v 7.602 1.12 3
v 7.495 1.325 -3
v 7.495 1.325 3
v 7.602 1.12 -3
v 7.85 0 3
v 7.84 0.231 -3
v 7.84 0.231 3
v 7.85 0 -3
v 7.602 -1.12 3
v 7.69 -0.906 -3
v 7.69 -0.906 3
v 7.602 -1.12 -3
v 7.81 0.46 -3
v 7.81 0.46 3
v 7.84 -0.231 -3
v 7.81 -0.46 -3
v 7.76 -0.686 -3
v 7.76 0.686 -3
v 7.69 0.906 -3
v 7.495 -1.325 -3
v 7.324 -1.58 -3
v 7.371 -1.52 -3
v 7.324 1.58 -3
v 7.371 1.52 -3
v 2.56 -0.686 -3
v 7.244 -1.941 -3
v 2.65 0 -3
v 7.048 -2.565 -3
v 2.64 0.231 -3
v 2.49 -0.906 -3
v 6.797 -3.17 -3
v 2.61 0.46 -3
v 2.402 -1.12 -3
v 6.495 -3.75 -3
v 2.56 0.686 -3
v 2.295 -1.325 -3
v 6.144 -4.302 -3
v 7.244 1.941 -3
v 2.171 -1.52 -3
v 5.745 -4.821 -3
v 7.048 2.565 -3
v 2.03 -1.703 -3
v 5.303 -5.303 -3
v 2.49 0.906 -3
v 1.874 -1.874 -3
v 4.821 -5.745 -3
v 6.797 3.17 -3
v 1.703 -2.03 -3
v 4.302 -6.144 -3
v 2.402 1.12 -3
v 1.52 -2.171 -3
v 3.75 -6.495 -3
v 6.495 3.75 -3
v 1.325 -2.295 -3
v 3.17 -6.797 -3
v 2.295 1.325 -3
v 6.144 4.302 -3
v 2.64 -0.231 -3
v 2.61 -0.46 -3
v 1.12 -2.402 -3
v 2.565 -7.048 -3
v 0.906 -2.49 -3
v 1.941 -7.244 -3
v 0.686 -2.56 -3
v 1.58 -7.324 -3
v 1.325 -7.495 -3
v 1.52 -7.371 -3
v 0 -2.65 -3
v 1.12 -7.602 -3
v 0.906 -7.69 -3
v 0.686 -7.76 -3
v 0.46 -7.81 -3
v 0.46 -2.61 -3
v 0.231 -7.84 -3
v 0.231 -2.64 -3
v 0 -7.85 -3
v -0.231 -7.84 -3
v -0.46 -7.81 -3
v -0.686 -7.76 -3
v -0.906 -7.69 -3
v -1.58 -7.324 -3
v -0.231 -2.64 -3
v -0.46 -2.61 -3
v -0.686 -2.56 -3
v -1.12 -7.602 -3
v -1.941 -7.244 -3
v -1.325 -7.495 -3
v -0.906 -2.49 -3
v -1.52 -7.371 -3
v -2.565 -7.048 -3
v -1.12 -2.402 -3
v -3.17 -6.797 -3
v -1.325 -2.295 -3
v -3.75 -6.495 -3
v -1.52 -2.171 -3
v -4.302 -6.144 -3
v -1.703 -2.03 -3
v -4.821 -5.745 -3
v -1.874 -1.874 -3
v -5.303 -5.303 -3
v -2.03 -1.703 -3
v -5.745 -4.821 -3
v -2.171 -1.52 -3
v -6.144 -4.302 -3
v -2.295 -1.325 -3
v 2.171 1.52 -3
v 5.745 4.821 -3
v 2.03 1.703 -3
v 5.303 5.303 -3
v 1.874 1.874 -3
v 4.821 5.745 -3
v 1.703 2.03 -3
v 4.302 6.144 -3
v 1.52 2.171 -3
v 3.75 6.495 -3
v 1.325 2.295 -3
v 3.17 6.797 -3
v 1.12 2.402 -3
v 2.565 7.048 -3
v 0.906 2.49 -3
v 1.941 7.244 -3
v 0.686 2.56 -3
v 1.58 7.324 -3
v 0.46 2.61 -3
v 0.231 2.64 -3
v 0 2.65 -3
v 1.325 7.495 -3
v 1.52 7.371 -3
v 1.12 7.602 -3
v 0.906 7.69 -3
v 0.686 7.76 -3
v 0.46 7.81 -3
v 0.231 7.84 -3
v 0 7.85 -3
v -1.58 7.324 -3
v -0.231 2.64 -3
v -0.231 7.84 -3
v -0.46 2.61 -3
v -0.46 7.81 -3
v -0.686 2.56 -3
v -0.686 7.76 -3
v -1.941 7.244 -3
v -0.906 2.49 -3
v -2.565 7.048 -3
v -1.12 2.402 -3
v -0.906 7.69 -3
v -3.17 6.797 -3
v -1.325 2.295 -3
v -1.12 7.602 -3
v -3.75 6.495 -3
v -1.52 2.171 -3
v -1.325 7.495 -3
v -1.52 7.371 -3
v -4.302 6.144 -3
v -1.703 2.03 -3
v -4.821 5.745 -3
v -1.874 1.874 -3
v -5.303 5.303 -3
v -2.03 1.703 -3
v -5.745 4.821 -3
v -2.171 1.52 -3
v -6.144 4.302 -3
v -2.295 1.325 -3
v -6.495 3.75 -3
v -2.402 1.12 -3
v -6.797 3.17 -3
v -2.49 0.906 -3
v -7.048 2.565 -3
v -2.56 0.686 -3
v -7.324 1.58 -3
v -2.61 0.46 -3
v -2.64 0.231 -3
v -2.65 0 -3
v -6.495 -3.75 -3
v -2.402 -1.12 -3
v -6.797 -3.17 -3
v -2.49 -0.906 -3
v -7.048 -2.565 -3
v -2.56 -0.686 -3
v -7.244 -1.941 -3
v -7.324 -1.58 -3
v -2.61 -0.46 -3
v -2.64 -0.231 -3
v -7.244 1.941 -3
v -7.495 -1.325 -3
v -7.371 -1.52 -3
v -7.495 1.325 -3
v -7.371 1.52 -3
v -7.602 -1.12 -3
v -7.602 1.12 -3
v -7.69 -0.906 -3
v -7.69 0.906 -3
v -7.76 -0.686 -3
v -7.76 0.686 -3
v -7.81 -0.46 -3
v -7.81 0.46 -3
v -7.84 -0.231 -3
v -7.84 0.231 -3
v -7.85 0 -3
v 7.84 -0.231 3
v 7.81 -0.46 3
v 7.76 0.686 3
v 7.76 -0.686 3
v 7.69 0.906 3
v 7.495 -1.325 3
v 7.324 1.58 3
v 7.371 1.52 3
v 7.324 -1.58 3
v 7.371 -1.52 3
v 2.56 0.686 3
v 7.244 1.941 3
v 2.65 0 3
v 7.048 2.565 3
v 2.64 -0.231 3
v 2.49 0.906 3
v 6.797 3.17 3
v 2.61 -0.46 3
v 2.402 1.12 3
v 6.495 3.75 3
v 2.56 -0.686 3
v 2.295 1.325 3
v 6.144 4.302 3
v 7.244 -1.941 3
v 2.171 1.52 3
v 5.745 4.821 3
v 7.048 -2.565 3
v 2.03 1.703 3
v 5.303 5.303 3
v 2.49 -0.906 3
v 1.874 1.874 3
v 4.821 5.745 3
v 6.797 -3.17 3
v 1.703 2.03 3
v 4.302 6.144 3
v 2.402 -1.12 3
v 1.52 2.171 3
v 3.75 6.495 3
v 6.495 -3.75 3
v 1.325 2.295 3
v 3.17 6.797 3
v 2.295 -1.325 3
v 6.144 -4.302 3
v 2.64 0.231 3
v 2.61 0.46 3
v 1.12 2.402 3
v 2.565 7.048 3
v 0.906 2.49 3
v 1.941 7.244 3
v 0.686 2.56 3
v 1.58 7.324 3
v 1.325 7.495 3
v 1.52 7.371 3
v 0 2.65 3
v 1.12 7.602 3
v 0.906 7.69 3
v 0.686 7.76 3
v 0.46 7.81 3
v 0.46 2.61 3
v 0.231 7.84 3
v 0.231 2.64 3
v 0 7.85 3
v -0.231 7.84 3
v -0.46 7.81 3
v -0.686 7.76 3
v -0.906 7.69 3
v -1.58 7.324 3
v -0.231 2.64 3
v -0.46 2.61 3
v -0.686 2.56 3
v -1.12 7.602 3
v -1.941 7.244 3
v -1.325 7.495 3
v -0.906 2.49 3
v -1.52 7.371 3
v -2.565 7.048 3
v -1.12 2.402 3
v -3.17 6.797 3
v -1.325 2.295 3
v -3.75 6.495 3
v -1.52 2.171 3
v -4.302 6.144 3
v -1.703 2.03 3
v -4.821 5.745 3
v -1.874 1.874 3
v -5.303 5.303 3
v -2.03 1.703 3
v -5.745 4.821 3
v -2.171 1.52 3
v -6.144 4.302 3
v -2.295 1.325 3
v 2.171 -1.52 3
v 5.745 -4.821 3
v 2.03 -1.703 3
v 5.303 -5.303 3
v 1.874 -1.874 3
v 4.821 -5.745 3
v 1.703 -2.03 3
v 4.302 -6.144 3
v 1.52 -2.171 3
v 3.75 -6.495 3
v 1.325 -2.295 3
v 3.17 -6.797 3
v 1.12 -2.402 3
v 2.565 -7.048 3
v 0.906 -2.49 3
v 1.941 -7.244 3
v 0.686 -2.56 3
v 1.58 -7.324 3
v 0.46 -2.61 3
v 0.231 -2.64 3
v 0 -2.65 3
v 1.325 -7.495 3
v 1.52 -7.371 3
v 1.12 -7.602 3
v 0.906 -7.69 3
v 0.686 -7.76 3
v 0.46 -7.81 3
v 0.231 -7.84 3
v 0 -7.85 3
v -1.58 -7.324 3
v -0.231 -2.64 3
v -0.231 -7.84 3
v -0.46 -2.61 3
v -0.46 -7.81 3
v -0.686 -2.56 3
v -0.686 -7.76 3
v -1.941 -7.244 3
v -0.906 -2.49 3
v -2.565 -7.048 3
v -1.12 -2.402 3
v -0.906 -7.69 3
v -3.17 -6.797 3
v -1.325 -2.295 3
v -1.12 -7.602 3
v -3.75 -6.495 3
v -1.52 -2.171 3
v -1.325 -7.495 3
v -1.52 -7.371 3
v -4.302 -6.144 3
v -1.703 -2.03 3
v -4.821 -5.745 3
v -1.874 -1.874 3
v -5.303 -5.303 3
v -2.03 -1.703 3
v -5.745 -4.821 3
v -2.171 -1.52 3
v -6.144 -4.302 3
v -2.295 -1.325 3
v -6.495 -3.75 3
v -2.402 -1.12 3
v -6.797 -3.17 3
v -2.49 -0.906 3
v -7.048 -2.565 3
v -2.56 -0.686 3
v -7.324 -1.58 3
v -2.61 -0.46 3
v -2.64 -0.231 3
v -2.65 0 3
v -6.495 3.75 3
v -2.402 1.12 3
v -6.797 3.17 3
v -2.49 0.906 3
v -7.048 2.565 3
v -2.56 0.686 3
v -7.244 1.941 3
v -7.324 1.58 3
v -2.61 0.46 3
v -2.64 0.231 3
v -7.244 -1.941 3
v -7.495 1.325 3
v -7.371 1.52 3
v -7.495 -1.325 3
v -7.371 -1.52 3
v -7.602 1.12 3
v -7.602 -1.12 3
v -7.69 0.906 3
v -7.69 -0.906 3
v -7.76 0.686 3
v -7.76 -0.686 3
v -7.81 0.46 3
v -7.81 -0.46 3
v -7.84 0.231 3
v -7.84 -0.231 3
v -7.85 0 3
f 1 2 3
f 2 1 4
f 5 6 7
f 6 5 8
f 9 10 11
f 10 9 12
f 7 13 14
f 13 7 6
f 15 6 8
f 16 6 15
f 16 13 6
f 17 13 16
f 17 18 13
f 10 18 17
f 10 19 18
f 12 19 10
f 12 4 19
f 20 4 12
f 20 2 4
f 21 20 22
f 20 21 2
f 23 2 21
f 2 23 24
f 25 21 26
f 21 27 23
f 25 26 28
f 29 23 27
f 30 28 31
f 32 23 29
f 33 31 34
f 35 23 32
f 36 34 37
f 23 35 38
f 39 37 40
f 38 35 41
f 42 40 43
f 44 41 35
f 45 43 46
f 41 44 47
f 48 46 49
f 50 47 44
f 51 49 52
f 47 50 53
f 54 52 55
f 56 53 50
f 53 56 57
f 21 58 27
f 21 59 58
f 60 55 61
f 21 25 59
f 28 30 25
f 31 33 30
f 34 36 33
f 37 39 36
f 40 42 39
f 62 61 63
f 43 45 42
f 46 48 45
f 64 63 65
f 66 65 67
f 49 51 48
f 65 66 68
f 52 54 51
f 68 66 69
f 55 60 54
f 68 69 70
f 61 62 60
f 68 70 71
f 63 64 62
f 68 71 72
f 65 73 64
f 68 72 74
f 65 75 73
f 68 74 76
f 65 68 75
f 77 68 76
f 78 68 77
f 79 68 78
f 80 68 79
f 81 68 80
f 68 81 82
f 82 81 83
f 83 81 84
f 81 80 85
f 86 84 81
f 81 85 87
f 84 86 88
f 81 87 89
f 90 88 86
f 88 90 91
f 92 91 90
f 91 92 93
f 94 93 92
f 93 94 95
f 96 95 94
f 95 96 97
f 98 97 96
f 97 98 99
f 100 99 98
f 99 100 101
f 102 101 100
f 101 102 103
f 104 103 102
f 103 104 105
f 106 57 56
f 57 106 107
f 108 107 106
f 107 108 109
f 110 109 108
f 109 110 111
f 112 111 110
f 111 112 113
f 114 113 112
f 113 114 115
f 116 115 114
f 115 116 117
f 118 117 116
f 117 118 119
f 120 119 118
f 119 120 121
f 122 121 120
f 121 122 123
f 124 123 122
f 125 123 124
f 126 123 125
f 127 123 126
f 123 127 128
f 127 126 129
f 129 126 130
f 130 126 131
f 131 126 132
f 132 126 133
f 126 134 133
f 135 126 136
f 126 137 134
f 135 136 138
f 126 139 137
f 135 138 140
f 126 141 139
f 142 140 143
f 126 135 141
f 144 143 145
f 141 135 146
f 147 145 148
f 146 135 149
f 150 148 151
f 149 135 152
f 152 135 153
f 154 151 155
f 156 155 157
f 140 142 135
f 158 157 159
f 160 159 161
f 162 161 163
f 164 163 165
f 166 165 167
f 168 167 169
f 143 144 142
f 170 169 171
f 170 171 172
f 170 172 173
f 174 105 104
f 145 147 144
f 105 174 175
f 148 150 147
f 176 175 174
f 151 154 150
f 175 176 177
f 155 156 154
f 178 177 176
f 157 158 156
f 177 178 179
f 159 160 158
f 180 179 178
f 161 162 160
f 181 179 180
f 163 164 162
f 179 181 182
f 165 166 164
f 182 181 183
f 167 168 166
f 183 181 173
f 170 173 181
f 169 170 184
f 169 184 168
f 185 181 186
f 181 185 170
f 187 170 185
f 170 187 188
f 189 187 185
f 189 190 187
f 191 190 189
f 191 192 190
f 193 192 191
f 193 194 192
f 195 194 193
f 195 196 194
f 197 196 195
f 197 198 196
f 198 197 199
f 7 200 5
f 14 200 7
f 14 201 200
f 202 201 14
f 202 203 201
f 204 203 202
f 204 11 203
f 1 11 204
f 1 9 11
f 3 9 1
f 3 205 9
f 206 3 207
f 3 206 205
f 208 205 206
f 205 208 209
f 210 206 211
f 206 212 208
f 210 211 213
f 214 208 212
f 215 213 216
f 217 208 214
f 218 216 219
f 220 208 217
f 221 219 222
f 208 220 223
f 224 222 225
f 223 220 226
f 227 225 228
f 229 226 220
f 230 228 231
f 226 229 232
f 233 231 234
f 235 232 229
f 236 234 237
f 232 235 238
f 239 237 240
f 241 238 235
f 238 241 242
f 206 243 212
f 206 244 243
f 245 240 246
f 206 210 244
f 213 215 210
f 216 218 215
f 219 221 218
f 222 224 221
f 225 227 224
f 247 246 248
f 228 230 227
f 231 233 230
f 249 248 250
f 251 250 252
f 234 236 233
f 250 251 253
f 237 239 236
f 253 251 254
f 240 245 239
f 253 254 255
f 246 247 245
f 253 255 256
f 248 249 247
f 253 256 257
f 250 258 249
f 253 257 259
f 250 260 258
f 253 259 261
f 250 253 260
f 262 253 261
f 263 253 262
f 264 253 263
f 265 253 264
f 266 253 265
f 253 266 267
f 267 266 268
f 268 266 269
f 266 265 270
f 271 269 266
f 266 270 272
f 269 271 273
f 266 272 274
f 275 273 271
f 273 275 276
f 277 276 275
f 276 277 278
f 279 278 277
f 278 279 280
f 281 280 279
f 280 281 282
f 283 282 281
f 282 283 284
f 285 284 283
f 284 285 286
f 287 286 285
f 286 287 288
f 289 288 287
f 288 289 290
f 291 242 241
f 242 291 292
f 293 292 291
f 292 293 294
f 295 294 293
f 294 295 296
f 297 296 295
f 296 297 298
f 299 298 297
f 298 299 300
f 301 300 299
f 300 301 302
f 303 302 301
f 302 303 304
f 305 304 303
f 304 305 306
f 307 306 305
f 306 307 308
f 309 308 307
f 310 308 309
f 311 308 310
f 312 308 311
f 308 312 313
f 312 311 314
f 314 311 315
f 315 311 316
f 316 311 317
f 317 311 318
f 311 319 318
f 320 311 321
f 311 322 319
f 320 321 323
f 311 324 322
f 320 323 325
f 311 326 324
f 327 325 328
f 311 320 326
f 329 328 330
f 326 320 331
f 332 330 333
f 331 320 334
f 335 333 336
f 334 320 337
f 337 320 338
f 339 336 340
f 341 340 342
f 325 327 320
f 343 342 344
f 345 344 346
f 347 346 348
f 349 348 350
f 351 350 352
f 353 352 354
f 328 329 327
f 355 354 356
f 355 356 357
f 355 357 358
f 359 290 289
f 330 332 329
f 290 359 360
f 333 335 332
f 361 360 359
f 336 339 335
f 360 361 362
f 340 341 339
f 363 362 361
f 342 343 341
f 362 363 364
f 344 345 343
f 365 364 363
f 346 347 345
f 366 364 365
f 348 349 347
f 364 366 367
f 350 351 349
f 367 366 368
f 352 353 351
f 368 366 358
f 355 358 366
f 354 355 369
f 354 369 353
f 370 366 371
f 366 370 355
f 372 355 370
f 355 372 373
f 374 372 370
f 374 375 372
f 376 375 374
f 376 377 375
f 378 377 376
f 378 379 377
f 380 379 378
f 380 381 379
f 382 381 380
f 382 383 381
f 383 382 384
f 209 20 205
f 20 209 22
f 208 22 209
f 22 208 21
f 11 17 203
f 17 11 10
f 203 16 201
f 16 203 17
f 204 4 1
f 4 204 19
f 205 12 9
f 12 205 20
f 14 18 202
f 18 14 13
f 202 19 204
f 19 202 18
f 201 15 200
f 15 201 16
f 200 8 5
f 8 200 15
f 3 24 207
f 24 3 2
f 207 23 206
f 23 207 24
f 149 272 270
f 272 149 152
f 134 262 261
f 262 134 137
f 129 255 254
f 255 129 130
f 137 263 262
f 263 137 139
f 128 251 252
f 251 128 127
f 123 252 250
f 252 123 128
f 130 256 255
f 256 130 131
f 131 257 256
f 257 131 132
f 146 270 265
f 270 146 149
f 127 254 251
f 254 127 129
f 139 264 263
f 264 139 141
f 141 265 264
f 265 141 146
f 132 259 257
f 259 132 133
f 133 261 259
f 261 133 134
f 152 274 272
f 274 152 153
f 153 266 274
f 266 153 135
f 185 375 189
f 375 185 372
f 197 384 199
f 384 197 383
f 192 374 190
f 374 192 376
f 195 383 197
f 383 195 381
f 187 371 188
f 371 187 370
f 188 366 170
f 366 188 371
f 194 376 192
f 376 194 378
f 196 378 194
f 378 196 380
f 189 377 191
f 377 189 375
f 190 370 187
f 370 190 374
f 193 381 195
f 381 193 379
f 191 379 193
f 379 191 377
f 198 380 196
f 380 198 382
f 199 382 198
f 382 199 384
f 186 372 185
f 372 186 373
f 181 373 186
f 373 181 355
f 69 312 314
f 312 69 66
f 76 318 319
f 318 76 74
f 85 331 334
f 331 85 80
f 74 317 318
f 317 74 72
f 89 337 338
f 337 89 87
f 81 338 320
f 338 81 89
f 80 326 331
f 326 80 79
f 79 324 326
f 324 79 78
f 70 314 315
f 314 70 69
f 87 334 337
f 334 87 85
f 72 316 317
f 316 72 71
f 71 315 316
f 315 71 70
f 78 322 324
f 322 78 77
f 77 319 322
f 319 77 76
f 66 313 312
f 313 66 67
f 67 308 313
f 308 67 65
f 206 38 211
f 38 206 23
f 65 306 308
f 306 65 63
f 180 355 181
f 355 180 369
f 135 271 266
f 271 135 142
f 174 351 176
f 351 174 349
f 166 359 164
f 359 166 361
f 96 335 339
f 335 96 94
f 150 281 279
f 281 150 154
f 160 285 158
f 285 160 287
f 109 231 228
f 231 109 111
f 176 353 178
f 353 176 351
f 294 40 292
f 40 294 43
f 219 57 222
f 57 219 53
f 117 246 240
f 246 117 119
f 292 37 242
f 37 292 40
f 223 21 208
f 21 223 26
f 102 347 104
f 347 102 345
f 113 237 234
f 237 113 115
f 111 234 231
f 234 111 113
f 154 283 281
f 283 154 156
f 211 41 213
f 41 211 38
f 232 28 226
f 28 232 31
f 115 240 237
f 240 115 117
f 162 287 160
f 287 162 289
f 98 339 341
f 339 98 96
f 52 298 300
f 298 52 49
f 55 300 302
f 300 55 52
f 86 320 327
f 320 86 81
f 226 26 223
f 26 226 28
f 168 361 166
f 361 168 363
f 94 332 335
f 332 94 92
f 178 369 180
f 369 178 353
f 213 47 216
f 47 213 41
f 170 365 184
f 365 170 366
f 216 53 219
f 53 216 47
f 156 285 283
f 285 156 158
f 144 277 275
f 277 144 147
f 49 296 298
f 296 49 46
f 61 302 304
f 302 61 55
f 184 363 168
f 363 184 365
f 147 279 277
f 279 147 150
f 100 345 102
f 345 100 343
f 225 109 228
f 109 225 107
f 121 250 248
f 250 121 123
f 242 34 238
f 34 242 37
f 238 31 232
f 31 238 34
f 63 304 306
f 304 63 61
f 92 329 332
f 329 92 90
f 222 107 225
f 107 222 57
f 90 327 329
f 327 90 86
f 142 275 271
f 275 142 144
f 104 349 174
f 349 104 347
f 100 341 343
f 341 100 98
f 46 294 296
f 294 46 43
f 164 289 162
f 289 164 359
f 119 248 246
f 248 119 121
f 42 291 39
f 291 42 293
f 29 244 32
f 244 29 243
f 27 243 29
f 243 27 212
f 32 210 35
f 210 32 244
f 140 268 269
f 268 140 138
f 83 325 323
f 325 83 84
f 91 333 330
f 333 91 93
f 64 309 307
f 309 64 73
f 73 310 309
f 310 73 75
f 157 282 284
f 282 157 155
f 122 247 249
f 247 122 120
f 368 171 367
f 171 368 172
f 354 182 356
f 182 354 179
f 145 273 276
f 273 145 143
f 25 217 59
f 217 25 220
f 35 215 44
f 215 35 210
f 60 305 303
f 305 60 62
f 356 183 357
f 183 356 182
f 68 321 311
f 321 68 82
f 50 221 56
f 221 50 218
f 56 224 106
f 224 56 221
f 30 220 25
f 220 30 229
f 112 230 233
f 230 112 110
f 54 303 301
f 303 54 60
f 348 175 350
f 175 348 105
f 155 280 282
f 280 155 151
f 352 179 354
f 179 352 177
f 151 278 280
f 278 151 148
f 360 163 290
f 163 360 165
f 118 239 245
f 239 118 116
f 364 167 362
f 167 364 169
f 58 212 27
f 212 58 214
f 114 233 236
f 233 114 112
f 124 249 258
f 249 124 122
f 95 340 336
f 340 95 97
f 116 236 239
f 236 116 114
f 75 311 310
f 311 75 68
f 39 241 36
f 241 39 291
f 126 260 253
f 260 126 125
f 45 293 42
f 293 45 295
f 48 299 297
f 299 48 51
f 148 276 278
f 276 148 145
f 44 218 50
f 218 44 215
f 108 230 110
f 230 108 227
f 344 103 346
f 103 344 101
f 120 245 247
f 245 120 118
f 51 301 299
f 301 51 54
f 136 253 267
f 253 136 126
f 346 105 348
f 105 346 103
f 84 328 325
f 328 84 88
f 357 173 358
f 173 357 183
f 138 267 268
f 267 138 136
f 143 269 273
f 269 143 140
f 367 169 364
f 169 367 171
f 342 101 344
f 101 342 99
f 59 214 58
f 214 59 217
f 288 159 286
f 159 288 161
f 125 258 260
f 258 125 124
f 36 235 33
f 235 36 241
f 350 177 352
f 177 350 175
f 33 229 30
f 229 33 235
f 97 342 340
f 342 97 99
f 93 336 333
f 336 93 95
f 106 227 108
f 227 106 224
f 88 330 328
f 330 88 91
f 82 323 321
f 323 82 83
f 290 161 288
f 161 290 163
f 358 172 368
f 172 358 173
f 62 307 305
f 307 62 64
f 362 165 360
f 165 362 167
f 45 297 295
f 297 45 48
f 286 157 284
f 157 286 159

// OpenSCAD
// K'NEX Yellow 4-Way Connector (90°)
$fn = 72;

hub_r = 7.5;
hub_h = 6.0;
arm_w = 5.3;
arm_h = 6.0;
arm_len = 12.7;
hole_r = 2.65;
slot_w = 1.2;

module arm() {
    difference() {
        hull() {
            cylinder(h=arm_h, r=arm_w/2, center=true);
            translate([arm_len - hub_r, 0, 0])
                cylinder(h=arm_h, r=arm_w/2, center=true);
        }
        translate([arm_len, 0, 0])
            cylinder(h=arm_h+2, r=hole_r, center=true);
        translate([arm_len, 0, 0]) {
            translate([0, 0, arm_h/2])
                cube([slot_w, hole_r*2+1, 2], center=true);
            translate([0, 0, -arm_h/2])
                cube([slot_w, hole_r*2+1, 2], center=true);
        }
    }
}

module connector_4way() {
    difference() {
        union() {
            cylinder(h=hub_h, r=hub_r, center=true);
            for (a = [0, 90, 180, 270]) {
                rotate([0, 0, a]) arm();
            }
        }
        cylinder(h=hub_h+2, r=hole_r, center=true);
    }
}

connector_4way();
